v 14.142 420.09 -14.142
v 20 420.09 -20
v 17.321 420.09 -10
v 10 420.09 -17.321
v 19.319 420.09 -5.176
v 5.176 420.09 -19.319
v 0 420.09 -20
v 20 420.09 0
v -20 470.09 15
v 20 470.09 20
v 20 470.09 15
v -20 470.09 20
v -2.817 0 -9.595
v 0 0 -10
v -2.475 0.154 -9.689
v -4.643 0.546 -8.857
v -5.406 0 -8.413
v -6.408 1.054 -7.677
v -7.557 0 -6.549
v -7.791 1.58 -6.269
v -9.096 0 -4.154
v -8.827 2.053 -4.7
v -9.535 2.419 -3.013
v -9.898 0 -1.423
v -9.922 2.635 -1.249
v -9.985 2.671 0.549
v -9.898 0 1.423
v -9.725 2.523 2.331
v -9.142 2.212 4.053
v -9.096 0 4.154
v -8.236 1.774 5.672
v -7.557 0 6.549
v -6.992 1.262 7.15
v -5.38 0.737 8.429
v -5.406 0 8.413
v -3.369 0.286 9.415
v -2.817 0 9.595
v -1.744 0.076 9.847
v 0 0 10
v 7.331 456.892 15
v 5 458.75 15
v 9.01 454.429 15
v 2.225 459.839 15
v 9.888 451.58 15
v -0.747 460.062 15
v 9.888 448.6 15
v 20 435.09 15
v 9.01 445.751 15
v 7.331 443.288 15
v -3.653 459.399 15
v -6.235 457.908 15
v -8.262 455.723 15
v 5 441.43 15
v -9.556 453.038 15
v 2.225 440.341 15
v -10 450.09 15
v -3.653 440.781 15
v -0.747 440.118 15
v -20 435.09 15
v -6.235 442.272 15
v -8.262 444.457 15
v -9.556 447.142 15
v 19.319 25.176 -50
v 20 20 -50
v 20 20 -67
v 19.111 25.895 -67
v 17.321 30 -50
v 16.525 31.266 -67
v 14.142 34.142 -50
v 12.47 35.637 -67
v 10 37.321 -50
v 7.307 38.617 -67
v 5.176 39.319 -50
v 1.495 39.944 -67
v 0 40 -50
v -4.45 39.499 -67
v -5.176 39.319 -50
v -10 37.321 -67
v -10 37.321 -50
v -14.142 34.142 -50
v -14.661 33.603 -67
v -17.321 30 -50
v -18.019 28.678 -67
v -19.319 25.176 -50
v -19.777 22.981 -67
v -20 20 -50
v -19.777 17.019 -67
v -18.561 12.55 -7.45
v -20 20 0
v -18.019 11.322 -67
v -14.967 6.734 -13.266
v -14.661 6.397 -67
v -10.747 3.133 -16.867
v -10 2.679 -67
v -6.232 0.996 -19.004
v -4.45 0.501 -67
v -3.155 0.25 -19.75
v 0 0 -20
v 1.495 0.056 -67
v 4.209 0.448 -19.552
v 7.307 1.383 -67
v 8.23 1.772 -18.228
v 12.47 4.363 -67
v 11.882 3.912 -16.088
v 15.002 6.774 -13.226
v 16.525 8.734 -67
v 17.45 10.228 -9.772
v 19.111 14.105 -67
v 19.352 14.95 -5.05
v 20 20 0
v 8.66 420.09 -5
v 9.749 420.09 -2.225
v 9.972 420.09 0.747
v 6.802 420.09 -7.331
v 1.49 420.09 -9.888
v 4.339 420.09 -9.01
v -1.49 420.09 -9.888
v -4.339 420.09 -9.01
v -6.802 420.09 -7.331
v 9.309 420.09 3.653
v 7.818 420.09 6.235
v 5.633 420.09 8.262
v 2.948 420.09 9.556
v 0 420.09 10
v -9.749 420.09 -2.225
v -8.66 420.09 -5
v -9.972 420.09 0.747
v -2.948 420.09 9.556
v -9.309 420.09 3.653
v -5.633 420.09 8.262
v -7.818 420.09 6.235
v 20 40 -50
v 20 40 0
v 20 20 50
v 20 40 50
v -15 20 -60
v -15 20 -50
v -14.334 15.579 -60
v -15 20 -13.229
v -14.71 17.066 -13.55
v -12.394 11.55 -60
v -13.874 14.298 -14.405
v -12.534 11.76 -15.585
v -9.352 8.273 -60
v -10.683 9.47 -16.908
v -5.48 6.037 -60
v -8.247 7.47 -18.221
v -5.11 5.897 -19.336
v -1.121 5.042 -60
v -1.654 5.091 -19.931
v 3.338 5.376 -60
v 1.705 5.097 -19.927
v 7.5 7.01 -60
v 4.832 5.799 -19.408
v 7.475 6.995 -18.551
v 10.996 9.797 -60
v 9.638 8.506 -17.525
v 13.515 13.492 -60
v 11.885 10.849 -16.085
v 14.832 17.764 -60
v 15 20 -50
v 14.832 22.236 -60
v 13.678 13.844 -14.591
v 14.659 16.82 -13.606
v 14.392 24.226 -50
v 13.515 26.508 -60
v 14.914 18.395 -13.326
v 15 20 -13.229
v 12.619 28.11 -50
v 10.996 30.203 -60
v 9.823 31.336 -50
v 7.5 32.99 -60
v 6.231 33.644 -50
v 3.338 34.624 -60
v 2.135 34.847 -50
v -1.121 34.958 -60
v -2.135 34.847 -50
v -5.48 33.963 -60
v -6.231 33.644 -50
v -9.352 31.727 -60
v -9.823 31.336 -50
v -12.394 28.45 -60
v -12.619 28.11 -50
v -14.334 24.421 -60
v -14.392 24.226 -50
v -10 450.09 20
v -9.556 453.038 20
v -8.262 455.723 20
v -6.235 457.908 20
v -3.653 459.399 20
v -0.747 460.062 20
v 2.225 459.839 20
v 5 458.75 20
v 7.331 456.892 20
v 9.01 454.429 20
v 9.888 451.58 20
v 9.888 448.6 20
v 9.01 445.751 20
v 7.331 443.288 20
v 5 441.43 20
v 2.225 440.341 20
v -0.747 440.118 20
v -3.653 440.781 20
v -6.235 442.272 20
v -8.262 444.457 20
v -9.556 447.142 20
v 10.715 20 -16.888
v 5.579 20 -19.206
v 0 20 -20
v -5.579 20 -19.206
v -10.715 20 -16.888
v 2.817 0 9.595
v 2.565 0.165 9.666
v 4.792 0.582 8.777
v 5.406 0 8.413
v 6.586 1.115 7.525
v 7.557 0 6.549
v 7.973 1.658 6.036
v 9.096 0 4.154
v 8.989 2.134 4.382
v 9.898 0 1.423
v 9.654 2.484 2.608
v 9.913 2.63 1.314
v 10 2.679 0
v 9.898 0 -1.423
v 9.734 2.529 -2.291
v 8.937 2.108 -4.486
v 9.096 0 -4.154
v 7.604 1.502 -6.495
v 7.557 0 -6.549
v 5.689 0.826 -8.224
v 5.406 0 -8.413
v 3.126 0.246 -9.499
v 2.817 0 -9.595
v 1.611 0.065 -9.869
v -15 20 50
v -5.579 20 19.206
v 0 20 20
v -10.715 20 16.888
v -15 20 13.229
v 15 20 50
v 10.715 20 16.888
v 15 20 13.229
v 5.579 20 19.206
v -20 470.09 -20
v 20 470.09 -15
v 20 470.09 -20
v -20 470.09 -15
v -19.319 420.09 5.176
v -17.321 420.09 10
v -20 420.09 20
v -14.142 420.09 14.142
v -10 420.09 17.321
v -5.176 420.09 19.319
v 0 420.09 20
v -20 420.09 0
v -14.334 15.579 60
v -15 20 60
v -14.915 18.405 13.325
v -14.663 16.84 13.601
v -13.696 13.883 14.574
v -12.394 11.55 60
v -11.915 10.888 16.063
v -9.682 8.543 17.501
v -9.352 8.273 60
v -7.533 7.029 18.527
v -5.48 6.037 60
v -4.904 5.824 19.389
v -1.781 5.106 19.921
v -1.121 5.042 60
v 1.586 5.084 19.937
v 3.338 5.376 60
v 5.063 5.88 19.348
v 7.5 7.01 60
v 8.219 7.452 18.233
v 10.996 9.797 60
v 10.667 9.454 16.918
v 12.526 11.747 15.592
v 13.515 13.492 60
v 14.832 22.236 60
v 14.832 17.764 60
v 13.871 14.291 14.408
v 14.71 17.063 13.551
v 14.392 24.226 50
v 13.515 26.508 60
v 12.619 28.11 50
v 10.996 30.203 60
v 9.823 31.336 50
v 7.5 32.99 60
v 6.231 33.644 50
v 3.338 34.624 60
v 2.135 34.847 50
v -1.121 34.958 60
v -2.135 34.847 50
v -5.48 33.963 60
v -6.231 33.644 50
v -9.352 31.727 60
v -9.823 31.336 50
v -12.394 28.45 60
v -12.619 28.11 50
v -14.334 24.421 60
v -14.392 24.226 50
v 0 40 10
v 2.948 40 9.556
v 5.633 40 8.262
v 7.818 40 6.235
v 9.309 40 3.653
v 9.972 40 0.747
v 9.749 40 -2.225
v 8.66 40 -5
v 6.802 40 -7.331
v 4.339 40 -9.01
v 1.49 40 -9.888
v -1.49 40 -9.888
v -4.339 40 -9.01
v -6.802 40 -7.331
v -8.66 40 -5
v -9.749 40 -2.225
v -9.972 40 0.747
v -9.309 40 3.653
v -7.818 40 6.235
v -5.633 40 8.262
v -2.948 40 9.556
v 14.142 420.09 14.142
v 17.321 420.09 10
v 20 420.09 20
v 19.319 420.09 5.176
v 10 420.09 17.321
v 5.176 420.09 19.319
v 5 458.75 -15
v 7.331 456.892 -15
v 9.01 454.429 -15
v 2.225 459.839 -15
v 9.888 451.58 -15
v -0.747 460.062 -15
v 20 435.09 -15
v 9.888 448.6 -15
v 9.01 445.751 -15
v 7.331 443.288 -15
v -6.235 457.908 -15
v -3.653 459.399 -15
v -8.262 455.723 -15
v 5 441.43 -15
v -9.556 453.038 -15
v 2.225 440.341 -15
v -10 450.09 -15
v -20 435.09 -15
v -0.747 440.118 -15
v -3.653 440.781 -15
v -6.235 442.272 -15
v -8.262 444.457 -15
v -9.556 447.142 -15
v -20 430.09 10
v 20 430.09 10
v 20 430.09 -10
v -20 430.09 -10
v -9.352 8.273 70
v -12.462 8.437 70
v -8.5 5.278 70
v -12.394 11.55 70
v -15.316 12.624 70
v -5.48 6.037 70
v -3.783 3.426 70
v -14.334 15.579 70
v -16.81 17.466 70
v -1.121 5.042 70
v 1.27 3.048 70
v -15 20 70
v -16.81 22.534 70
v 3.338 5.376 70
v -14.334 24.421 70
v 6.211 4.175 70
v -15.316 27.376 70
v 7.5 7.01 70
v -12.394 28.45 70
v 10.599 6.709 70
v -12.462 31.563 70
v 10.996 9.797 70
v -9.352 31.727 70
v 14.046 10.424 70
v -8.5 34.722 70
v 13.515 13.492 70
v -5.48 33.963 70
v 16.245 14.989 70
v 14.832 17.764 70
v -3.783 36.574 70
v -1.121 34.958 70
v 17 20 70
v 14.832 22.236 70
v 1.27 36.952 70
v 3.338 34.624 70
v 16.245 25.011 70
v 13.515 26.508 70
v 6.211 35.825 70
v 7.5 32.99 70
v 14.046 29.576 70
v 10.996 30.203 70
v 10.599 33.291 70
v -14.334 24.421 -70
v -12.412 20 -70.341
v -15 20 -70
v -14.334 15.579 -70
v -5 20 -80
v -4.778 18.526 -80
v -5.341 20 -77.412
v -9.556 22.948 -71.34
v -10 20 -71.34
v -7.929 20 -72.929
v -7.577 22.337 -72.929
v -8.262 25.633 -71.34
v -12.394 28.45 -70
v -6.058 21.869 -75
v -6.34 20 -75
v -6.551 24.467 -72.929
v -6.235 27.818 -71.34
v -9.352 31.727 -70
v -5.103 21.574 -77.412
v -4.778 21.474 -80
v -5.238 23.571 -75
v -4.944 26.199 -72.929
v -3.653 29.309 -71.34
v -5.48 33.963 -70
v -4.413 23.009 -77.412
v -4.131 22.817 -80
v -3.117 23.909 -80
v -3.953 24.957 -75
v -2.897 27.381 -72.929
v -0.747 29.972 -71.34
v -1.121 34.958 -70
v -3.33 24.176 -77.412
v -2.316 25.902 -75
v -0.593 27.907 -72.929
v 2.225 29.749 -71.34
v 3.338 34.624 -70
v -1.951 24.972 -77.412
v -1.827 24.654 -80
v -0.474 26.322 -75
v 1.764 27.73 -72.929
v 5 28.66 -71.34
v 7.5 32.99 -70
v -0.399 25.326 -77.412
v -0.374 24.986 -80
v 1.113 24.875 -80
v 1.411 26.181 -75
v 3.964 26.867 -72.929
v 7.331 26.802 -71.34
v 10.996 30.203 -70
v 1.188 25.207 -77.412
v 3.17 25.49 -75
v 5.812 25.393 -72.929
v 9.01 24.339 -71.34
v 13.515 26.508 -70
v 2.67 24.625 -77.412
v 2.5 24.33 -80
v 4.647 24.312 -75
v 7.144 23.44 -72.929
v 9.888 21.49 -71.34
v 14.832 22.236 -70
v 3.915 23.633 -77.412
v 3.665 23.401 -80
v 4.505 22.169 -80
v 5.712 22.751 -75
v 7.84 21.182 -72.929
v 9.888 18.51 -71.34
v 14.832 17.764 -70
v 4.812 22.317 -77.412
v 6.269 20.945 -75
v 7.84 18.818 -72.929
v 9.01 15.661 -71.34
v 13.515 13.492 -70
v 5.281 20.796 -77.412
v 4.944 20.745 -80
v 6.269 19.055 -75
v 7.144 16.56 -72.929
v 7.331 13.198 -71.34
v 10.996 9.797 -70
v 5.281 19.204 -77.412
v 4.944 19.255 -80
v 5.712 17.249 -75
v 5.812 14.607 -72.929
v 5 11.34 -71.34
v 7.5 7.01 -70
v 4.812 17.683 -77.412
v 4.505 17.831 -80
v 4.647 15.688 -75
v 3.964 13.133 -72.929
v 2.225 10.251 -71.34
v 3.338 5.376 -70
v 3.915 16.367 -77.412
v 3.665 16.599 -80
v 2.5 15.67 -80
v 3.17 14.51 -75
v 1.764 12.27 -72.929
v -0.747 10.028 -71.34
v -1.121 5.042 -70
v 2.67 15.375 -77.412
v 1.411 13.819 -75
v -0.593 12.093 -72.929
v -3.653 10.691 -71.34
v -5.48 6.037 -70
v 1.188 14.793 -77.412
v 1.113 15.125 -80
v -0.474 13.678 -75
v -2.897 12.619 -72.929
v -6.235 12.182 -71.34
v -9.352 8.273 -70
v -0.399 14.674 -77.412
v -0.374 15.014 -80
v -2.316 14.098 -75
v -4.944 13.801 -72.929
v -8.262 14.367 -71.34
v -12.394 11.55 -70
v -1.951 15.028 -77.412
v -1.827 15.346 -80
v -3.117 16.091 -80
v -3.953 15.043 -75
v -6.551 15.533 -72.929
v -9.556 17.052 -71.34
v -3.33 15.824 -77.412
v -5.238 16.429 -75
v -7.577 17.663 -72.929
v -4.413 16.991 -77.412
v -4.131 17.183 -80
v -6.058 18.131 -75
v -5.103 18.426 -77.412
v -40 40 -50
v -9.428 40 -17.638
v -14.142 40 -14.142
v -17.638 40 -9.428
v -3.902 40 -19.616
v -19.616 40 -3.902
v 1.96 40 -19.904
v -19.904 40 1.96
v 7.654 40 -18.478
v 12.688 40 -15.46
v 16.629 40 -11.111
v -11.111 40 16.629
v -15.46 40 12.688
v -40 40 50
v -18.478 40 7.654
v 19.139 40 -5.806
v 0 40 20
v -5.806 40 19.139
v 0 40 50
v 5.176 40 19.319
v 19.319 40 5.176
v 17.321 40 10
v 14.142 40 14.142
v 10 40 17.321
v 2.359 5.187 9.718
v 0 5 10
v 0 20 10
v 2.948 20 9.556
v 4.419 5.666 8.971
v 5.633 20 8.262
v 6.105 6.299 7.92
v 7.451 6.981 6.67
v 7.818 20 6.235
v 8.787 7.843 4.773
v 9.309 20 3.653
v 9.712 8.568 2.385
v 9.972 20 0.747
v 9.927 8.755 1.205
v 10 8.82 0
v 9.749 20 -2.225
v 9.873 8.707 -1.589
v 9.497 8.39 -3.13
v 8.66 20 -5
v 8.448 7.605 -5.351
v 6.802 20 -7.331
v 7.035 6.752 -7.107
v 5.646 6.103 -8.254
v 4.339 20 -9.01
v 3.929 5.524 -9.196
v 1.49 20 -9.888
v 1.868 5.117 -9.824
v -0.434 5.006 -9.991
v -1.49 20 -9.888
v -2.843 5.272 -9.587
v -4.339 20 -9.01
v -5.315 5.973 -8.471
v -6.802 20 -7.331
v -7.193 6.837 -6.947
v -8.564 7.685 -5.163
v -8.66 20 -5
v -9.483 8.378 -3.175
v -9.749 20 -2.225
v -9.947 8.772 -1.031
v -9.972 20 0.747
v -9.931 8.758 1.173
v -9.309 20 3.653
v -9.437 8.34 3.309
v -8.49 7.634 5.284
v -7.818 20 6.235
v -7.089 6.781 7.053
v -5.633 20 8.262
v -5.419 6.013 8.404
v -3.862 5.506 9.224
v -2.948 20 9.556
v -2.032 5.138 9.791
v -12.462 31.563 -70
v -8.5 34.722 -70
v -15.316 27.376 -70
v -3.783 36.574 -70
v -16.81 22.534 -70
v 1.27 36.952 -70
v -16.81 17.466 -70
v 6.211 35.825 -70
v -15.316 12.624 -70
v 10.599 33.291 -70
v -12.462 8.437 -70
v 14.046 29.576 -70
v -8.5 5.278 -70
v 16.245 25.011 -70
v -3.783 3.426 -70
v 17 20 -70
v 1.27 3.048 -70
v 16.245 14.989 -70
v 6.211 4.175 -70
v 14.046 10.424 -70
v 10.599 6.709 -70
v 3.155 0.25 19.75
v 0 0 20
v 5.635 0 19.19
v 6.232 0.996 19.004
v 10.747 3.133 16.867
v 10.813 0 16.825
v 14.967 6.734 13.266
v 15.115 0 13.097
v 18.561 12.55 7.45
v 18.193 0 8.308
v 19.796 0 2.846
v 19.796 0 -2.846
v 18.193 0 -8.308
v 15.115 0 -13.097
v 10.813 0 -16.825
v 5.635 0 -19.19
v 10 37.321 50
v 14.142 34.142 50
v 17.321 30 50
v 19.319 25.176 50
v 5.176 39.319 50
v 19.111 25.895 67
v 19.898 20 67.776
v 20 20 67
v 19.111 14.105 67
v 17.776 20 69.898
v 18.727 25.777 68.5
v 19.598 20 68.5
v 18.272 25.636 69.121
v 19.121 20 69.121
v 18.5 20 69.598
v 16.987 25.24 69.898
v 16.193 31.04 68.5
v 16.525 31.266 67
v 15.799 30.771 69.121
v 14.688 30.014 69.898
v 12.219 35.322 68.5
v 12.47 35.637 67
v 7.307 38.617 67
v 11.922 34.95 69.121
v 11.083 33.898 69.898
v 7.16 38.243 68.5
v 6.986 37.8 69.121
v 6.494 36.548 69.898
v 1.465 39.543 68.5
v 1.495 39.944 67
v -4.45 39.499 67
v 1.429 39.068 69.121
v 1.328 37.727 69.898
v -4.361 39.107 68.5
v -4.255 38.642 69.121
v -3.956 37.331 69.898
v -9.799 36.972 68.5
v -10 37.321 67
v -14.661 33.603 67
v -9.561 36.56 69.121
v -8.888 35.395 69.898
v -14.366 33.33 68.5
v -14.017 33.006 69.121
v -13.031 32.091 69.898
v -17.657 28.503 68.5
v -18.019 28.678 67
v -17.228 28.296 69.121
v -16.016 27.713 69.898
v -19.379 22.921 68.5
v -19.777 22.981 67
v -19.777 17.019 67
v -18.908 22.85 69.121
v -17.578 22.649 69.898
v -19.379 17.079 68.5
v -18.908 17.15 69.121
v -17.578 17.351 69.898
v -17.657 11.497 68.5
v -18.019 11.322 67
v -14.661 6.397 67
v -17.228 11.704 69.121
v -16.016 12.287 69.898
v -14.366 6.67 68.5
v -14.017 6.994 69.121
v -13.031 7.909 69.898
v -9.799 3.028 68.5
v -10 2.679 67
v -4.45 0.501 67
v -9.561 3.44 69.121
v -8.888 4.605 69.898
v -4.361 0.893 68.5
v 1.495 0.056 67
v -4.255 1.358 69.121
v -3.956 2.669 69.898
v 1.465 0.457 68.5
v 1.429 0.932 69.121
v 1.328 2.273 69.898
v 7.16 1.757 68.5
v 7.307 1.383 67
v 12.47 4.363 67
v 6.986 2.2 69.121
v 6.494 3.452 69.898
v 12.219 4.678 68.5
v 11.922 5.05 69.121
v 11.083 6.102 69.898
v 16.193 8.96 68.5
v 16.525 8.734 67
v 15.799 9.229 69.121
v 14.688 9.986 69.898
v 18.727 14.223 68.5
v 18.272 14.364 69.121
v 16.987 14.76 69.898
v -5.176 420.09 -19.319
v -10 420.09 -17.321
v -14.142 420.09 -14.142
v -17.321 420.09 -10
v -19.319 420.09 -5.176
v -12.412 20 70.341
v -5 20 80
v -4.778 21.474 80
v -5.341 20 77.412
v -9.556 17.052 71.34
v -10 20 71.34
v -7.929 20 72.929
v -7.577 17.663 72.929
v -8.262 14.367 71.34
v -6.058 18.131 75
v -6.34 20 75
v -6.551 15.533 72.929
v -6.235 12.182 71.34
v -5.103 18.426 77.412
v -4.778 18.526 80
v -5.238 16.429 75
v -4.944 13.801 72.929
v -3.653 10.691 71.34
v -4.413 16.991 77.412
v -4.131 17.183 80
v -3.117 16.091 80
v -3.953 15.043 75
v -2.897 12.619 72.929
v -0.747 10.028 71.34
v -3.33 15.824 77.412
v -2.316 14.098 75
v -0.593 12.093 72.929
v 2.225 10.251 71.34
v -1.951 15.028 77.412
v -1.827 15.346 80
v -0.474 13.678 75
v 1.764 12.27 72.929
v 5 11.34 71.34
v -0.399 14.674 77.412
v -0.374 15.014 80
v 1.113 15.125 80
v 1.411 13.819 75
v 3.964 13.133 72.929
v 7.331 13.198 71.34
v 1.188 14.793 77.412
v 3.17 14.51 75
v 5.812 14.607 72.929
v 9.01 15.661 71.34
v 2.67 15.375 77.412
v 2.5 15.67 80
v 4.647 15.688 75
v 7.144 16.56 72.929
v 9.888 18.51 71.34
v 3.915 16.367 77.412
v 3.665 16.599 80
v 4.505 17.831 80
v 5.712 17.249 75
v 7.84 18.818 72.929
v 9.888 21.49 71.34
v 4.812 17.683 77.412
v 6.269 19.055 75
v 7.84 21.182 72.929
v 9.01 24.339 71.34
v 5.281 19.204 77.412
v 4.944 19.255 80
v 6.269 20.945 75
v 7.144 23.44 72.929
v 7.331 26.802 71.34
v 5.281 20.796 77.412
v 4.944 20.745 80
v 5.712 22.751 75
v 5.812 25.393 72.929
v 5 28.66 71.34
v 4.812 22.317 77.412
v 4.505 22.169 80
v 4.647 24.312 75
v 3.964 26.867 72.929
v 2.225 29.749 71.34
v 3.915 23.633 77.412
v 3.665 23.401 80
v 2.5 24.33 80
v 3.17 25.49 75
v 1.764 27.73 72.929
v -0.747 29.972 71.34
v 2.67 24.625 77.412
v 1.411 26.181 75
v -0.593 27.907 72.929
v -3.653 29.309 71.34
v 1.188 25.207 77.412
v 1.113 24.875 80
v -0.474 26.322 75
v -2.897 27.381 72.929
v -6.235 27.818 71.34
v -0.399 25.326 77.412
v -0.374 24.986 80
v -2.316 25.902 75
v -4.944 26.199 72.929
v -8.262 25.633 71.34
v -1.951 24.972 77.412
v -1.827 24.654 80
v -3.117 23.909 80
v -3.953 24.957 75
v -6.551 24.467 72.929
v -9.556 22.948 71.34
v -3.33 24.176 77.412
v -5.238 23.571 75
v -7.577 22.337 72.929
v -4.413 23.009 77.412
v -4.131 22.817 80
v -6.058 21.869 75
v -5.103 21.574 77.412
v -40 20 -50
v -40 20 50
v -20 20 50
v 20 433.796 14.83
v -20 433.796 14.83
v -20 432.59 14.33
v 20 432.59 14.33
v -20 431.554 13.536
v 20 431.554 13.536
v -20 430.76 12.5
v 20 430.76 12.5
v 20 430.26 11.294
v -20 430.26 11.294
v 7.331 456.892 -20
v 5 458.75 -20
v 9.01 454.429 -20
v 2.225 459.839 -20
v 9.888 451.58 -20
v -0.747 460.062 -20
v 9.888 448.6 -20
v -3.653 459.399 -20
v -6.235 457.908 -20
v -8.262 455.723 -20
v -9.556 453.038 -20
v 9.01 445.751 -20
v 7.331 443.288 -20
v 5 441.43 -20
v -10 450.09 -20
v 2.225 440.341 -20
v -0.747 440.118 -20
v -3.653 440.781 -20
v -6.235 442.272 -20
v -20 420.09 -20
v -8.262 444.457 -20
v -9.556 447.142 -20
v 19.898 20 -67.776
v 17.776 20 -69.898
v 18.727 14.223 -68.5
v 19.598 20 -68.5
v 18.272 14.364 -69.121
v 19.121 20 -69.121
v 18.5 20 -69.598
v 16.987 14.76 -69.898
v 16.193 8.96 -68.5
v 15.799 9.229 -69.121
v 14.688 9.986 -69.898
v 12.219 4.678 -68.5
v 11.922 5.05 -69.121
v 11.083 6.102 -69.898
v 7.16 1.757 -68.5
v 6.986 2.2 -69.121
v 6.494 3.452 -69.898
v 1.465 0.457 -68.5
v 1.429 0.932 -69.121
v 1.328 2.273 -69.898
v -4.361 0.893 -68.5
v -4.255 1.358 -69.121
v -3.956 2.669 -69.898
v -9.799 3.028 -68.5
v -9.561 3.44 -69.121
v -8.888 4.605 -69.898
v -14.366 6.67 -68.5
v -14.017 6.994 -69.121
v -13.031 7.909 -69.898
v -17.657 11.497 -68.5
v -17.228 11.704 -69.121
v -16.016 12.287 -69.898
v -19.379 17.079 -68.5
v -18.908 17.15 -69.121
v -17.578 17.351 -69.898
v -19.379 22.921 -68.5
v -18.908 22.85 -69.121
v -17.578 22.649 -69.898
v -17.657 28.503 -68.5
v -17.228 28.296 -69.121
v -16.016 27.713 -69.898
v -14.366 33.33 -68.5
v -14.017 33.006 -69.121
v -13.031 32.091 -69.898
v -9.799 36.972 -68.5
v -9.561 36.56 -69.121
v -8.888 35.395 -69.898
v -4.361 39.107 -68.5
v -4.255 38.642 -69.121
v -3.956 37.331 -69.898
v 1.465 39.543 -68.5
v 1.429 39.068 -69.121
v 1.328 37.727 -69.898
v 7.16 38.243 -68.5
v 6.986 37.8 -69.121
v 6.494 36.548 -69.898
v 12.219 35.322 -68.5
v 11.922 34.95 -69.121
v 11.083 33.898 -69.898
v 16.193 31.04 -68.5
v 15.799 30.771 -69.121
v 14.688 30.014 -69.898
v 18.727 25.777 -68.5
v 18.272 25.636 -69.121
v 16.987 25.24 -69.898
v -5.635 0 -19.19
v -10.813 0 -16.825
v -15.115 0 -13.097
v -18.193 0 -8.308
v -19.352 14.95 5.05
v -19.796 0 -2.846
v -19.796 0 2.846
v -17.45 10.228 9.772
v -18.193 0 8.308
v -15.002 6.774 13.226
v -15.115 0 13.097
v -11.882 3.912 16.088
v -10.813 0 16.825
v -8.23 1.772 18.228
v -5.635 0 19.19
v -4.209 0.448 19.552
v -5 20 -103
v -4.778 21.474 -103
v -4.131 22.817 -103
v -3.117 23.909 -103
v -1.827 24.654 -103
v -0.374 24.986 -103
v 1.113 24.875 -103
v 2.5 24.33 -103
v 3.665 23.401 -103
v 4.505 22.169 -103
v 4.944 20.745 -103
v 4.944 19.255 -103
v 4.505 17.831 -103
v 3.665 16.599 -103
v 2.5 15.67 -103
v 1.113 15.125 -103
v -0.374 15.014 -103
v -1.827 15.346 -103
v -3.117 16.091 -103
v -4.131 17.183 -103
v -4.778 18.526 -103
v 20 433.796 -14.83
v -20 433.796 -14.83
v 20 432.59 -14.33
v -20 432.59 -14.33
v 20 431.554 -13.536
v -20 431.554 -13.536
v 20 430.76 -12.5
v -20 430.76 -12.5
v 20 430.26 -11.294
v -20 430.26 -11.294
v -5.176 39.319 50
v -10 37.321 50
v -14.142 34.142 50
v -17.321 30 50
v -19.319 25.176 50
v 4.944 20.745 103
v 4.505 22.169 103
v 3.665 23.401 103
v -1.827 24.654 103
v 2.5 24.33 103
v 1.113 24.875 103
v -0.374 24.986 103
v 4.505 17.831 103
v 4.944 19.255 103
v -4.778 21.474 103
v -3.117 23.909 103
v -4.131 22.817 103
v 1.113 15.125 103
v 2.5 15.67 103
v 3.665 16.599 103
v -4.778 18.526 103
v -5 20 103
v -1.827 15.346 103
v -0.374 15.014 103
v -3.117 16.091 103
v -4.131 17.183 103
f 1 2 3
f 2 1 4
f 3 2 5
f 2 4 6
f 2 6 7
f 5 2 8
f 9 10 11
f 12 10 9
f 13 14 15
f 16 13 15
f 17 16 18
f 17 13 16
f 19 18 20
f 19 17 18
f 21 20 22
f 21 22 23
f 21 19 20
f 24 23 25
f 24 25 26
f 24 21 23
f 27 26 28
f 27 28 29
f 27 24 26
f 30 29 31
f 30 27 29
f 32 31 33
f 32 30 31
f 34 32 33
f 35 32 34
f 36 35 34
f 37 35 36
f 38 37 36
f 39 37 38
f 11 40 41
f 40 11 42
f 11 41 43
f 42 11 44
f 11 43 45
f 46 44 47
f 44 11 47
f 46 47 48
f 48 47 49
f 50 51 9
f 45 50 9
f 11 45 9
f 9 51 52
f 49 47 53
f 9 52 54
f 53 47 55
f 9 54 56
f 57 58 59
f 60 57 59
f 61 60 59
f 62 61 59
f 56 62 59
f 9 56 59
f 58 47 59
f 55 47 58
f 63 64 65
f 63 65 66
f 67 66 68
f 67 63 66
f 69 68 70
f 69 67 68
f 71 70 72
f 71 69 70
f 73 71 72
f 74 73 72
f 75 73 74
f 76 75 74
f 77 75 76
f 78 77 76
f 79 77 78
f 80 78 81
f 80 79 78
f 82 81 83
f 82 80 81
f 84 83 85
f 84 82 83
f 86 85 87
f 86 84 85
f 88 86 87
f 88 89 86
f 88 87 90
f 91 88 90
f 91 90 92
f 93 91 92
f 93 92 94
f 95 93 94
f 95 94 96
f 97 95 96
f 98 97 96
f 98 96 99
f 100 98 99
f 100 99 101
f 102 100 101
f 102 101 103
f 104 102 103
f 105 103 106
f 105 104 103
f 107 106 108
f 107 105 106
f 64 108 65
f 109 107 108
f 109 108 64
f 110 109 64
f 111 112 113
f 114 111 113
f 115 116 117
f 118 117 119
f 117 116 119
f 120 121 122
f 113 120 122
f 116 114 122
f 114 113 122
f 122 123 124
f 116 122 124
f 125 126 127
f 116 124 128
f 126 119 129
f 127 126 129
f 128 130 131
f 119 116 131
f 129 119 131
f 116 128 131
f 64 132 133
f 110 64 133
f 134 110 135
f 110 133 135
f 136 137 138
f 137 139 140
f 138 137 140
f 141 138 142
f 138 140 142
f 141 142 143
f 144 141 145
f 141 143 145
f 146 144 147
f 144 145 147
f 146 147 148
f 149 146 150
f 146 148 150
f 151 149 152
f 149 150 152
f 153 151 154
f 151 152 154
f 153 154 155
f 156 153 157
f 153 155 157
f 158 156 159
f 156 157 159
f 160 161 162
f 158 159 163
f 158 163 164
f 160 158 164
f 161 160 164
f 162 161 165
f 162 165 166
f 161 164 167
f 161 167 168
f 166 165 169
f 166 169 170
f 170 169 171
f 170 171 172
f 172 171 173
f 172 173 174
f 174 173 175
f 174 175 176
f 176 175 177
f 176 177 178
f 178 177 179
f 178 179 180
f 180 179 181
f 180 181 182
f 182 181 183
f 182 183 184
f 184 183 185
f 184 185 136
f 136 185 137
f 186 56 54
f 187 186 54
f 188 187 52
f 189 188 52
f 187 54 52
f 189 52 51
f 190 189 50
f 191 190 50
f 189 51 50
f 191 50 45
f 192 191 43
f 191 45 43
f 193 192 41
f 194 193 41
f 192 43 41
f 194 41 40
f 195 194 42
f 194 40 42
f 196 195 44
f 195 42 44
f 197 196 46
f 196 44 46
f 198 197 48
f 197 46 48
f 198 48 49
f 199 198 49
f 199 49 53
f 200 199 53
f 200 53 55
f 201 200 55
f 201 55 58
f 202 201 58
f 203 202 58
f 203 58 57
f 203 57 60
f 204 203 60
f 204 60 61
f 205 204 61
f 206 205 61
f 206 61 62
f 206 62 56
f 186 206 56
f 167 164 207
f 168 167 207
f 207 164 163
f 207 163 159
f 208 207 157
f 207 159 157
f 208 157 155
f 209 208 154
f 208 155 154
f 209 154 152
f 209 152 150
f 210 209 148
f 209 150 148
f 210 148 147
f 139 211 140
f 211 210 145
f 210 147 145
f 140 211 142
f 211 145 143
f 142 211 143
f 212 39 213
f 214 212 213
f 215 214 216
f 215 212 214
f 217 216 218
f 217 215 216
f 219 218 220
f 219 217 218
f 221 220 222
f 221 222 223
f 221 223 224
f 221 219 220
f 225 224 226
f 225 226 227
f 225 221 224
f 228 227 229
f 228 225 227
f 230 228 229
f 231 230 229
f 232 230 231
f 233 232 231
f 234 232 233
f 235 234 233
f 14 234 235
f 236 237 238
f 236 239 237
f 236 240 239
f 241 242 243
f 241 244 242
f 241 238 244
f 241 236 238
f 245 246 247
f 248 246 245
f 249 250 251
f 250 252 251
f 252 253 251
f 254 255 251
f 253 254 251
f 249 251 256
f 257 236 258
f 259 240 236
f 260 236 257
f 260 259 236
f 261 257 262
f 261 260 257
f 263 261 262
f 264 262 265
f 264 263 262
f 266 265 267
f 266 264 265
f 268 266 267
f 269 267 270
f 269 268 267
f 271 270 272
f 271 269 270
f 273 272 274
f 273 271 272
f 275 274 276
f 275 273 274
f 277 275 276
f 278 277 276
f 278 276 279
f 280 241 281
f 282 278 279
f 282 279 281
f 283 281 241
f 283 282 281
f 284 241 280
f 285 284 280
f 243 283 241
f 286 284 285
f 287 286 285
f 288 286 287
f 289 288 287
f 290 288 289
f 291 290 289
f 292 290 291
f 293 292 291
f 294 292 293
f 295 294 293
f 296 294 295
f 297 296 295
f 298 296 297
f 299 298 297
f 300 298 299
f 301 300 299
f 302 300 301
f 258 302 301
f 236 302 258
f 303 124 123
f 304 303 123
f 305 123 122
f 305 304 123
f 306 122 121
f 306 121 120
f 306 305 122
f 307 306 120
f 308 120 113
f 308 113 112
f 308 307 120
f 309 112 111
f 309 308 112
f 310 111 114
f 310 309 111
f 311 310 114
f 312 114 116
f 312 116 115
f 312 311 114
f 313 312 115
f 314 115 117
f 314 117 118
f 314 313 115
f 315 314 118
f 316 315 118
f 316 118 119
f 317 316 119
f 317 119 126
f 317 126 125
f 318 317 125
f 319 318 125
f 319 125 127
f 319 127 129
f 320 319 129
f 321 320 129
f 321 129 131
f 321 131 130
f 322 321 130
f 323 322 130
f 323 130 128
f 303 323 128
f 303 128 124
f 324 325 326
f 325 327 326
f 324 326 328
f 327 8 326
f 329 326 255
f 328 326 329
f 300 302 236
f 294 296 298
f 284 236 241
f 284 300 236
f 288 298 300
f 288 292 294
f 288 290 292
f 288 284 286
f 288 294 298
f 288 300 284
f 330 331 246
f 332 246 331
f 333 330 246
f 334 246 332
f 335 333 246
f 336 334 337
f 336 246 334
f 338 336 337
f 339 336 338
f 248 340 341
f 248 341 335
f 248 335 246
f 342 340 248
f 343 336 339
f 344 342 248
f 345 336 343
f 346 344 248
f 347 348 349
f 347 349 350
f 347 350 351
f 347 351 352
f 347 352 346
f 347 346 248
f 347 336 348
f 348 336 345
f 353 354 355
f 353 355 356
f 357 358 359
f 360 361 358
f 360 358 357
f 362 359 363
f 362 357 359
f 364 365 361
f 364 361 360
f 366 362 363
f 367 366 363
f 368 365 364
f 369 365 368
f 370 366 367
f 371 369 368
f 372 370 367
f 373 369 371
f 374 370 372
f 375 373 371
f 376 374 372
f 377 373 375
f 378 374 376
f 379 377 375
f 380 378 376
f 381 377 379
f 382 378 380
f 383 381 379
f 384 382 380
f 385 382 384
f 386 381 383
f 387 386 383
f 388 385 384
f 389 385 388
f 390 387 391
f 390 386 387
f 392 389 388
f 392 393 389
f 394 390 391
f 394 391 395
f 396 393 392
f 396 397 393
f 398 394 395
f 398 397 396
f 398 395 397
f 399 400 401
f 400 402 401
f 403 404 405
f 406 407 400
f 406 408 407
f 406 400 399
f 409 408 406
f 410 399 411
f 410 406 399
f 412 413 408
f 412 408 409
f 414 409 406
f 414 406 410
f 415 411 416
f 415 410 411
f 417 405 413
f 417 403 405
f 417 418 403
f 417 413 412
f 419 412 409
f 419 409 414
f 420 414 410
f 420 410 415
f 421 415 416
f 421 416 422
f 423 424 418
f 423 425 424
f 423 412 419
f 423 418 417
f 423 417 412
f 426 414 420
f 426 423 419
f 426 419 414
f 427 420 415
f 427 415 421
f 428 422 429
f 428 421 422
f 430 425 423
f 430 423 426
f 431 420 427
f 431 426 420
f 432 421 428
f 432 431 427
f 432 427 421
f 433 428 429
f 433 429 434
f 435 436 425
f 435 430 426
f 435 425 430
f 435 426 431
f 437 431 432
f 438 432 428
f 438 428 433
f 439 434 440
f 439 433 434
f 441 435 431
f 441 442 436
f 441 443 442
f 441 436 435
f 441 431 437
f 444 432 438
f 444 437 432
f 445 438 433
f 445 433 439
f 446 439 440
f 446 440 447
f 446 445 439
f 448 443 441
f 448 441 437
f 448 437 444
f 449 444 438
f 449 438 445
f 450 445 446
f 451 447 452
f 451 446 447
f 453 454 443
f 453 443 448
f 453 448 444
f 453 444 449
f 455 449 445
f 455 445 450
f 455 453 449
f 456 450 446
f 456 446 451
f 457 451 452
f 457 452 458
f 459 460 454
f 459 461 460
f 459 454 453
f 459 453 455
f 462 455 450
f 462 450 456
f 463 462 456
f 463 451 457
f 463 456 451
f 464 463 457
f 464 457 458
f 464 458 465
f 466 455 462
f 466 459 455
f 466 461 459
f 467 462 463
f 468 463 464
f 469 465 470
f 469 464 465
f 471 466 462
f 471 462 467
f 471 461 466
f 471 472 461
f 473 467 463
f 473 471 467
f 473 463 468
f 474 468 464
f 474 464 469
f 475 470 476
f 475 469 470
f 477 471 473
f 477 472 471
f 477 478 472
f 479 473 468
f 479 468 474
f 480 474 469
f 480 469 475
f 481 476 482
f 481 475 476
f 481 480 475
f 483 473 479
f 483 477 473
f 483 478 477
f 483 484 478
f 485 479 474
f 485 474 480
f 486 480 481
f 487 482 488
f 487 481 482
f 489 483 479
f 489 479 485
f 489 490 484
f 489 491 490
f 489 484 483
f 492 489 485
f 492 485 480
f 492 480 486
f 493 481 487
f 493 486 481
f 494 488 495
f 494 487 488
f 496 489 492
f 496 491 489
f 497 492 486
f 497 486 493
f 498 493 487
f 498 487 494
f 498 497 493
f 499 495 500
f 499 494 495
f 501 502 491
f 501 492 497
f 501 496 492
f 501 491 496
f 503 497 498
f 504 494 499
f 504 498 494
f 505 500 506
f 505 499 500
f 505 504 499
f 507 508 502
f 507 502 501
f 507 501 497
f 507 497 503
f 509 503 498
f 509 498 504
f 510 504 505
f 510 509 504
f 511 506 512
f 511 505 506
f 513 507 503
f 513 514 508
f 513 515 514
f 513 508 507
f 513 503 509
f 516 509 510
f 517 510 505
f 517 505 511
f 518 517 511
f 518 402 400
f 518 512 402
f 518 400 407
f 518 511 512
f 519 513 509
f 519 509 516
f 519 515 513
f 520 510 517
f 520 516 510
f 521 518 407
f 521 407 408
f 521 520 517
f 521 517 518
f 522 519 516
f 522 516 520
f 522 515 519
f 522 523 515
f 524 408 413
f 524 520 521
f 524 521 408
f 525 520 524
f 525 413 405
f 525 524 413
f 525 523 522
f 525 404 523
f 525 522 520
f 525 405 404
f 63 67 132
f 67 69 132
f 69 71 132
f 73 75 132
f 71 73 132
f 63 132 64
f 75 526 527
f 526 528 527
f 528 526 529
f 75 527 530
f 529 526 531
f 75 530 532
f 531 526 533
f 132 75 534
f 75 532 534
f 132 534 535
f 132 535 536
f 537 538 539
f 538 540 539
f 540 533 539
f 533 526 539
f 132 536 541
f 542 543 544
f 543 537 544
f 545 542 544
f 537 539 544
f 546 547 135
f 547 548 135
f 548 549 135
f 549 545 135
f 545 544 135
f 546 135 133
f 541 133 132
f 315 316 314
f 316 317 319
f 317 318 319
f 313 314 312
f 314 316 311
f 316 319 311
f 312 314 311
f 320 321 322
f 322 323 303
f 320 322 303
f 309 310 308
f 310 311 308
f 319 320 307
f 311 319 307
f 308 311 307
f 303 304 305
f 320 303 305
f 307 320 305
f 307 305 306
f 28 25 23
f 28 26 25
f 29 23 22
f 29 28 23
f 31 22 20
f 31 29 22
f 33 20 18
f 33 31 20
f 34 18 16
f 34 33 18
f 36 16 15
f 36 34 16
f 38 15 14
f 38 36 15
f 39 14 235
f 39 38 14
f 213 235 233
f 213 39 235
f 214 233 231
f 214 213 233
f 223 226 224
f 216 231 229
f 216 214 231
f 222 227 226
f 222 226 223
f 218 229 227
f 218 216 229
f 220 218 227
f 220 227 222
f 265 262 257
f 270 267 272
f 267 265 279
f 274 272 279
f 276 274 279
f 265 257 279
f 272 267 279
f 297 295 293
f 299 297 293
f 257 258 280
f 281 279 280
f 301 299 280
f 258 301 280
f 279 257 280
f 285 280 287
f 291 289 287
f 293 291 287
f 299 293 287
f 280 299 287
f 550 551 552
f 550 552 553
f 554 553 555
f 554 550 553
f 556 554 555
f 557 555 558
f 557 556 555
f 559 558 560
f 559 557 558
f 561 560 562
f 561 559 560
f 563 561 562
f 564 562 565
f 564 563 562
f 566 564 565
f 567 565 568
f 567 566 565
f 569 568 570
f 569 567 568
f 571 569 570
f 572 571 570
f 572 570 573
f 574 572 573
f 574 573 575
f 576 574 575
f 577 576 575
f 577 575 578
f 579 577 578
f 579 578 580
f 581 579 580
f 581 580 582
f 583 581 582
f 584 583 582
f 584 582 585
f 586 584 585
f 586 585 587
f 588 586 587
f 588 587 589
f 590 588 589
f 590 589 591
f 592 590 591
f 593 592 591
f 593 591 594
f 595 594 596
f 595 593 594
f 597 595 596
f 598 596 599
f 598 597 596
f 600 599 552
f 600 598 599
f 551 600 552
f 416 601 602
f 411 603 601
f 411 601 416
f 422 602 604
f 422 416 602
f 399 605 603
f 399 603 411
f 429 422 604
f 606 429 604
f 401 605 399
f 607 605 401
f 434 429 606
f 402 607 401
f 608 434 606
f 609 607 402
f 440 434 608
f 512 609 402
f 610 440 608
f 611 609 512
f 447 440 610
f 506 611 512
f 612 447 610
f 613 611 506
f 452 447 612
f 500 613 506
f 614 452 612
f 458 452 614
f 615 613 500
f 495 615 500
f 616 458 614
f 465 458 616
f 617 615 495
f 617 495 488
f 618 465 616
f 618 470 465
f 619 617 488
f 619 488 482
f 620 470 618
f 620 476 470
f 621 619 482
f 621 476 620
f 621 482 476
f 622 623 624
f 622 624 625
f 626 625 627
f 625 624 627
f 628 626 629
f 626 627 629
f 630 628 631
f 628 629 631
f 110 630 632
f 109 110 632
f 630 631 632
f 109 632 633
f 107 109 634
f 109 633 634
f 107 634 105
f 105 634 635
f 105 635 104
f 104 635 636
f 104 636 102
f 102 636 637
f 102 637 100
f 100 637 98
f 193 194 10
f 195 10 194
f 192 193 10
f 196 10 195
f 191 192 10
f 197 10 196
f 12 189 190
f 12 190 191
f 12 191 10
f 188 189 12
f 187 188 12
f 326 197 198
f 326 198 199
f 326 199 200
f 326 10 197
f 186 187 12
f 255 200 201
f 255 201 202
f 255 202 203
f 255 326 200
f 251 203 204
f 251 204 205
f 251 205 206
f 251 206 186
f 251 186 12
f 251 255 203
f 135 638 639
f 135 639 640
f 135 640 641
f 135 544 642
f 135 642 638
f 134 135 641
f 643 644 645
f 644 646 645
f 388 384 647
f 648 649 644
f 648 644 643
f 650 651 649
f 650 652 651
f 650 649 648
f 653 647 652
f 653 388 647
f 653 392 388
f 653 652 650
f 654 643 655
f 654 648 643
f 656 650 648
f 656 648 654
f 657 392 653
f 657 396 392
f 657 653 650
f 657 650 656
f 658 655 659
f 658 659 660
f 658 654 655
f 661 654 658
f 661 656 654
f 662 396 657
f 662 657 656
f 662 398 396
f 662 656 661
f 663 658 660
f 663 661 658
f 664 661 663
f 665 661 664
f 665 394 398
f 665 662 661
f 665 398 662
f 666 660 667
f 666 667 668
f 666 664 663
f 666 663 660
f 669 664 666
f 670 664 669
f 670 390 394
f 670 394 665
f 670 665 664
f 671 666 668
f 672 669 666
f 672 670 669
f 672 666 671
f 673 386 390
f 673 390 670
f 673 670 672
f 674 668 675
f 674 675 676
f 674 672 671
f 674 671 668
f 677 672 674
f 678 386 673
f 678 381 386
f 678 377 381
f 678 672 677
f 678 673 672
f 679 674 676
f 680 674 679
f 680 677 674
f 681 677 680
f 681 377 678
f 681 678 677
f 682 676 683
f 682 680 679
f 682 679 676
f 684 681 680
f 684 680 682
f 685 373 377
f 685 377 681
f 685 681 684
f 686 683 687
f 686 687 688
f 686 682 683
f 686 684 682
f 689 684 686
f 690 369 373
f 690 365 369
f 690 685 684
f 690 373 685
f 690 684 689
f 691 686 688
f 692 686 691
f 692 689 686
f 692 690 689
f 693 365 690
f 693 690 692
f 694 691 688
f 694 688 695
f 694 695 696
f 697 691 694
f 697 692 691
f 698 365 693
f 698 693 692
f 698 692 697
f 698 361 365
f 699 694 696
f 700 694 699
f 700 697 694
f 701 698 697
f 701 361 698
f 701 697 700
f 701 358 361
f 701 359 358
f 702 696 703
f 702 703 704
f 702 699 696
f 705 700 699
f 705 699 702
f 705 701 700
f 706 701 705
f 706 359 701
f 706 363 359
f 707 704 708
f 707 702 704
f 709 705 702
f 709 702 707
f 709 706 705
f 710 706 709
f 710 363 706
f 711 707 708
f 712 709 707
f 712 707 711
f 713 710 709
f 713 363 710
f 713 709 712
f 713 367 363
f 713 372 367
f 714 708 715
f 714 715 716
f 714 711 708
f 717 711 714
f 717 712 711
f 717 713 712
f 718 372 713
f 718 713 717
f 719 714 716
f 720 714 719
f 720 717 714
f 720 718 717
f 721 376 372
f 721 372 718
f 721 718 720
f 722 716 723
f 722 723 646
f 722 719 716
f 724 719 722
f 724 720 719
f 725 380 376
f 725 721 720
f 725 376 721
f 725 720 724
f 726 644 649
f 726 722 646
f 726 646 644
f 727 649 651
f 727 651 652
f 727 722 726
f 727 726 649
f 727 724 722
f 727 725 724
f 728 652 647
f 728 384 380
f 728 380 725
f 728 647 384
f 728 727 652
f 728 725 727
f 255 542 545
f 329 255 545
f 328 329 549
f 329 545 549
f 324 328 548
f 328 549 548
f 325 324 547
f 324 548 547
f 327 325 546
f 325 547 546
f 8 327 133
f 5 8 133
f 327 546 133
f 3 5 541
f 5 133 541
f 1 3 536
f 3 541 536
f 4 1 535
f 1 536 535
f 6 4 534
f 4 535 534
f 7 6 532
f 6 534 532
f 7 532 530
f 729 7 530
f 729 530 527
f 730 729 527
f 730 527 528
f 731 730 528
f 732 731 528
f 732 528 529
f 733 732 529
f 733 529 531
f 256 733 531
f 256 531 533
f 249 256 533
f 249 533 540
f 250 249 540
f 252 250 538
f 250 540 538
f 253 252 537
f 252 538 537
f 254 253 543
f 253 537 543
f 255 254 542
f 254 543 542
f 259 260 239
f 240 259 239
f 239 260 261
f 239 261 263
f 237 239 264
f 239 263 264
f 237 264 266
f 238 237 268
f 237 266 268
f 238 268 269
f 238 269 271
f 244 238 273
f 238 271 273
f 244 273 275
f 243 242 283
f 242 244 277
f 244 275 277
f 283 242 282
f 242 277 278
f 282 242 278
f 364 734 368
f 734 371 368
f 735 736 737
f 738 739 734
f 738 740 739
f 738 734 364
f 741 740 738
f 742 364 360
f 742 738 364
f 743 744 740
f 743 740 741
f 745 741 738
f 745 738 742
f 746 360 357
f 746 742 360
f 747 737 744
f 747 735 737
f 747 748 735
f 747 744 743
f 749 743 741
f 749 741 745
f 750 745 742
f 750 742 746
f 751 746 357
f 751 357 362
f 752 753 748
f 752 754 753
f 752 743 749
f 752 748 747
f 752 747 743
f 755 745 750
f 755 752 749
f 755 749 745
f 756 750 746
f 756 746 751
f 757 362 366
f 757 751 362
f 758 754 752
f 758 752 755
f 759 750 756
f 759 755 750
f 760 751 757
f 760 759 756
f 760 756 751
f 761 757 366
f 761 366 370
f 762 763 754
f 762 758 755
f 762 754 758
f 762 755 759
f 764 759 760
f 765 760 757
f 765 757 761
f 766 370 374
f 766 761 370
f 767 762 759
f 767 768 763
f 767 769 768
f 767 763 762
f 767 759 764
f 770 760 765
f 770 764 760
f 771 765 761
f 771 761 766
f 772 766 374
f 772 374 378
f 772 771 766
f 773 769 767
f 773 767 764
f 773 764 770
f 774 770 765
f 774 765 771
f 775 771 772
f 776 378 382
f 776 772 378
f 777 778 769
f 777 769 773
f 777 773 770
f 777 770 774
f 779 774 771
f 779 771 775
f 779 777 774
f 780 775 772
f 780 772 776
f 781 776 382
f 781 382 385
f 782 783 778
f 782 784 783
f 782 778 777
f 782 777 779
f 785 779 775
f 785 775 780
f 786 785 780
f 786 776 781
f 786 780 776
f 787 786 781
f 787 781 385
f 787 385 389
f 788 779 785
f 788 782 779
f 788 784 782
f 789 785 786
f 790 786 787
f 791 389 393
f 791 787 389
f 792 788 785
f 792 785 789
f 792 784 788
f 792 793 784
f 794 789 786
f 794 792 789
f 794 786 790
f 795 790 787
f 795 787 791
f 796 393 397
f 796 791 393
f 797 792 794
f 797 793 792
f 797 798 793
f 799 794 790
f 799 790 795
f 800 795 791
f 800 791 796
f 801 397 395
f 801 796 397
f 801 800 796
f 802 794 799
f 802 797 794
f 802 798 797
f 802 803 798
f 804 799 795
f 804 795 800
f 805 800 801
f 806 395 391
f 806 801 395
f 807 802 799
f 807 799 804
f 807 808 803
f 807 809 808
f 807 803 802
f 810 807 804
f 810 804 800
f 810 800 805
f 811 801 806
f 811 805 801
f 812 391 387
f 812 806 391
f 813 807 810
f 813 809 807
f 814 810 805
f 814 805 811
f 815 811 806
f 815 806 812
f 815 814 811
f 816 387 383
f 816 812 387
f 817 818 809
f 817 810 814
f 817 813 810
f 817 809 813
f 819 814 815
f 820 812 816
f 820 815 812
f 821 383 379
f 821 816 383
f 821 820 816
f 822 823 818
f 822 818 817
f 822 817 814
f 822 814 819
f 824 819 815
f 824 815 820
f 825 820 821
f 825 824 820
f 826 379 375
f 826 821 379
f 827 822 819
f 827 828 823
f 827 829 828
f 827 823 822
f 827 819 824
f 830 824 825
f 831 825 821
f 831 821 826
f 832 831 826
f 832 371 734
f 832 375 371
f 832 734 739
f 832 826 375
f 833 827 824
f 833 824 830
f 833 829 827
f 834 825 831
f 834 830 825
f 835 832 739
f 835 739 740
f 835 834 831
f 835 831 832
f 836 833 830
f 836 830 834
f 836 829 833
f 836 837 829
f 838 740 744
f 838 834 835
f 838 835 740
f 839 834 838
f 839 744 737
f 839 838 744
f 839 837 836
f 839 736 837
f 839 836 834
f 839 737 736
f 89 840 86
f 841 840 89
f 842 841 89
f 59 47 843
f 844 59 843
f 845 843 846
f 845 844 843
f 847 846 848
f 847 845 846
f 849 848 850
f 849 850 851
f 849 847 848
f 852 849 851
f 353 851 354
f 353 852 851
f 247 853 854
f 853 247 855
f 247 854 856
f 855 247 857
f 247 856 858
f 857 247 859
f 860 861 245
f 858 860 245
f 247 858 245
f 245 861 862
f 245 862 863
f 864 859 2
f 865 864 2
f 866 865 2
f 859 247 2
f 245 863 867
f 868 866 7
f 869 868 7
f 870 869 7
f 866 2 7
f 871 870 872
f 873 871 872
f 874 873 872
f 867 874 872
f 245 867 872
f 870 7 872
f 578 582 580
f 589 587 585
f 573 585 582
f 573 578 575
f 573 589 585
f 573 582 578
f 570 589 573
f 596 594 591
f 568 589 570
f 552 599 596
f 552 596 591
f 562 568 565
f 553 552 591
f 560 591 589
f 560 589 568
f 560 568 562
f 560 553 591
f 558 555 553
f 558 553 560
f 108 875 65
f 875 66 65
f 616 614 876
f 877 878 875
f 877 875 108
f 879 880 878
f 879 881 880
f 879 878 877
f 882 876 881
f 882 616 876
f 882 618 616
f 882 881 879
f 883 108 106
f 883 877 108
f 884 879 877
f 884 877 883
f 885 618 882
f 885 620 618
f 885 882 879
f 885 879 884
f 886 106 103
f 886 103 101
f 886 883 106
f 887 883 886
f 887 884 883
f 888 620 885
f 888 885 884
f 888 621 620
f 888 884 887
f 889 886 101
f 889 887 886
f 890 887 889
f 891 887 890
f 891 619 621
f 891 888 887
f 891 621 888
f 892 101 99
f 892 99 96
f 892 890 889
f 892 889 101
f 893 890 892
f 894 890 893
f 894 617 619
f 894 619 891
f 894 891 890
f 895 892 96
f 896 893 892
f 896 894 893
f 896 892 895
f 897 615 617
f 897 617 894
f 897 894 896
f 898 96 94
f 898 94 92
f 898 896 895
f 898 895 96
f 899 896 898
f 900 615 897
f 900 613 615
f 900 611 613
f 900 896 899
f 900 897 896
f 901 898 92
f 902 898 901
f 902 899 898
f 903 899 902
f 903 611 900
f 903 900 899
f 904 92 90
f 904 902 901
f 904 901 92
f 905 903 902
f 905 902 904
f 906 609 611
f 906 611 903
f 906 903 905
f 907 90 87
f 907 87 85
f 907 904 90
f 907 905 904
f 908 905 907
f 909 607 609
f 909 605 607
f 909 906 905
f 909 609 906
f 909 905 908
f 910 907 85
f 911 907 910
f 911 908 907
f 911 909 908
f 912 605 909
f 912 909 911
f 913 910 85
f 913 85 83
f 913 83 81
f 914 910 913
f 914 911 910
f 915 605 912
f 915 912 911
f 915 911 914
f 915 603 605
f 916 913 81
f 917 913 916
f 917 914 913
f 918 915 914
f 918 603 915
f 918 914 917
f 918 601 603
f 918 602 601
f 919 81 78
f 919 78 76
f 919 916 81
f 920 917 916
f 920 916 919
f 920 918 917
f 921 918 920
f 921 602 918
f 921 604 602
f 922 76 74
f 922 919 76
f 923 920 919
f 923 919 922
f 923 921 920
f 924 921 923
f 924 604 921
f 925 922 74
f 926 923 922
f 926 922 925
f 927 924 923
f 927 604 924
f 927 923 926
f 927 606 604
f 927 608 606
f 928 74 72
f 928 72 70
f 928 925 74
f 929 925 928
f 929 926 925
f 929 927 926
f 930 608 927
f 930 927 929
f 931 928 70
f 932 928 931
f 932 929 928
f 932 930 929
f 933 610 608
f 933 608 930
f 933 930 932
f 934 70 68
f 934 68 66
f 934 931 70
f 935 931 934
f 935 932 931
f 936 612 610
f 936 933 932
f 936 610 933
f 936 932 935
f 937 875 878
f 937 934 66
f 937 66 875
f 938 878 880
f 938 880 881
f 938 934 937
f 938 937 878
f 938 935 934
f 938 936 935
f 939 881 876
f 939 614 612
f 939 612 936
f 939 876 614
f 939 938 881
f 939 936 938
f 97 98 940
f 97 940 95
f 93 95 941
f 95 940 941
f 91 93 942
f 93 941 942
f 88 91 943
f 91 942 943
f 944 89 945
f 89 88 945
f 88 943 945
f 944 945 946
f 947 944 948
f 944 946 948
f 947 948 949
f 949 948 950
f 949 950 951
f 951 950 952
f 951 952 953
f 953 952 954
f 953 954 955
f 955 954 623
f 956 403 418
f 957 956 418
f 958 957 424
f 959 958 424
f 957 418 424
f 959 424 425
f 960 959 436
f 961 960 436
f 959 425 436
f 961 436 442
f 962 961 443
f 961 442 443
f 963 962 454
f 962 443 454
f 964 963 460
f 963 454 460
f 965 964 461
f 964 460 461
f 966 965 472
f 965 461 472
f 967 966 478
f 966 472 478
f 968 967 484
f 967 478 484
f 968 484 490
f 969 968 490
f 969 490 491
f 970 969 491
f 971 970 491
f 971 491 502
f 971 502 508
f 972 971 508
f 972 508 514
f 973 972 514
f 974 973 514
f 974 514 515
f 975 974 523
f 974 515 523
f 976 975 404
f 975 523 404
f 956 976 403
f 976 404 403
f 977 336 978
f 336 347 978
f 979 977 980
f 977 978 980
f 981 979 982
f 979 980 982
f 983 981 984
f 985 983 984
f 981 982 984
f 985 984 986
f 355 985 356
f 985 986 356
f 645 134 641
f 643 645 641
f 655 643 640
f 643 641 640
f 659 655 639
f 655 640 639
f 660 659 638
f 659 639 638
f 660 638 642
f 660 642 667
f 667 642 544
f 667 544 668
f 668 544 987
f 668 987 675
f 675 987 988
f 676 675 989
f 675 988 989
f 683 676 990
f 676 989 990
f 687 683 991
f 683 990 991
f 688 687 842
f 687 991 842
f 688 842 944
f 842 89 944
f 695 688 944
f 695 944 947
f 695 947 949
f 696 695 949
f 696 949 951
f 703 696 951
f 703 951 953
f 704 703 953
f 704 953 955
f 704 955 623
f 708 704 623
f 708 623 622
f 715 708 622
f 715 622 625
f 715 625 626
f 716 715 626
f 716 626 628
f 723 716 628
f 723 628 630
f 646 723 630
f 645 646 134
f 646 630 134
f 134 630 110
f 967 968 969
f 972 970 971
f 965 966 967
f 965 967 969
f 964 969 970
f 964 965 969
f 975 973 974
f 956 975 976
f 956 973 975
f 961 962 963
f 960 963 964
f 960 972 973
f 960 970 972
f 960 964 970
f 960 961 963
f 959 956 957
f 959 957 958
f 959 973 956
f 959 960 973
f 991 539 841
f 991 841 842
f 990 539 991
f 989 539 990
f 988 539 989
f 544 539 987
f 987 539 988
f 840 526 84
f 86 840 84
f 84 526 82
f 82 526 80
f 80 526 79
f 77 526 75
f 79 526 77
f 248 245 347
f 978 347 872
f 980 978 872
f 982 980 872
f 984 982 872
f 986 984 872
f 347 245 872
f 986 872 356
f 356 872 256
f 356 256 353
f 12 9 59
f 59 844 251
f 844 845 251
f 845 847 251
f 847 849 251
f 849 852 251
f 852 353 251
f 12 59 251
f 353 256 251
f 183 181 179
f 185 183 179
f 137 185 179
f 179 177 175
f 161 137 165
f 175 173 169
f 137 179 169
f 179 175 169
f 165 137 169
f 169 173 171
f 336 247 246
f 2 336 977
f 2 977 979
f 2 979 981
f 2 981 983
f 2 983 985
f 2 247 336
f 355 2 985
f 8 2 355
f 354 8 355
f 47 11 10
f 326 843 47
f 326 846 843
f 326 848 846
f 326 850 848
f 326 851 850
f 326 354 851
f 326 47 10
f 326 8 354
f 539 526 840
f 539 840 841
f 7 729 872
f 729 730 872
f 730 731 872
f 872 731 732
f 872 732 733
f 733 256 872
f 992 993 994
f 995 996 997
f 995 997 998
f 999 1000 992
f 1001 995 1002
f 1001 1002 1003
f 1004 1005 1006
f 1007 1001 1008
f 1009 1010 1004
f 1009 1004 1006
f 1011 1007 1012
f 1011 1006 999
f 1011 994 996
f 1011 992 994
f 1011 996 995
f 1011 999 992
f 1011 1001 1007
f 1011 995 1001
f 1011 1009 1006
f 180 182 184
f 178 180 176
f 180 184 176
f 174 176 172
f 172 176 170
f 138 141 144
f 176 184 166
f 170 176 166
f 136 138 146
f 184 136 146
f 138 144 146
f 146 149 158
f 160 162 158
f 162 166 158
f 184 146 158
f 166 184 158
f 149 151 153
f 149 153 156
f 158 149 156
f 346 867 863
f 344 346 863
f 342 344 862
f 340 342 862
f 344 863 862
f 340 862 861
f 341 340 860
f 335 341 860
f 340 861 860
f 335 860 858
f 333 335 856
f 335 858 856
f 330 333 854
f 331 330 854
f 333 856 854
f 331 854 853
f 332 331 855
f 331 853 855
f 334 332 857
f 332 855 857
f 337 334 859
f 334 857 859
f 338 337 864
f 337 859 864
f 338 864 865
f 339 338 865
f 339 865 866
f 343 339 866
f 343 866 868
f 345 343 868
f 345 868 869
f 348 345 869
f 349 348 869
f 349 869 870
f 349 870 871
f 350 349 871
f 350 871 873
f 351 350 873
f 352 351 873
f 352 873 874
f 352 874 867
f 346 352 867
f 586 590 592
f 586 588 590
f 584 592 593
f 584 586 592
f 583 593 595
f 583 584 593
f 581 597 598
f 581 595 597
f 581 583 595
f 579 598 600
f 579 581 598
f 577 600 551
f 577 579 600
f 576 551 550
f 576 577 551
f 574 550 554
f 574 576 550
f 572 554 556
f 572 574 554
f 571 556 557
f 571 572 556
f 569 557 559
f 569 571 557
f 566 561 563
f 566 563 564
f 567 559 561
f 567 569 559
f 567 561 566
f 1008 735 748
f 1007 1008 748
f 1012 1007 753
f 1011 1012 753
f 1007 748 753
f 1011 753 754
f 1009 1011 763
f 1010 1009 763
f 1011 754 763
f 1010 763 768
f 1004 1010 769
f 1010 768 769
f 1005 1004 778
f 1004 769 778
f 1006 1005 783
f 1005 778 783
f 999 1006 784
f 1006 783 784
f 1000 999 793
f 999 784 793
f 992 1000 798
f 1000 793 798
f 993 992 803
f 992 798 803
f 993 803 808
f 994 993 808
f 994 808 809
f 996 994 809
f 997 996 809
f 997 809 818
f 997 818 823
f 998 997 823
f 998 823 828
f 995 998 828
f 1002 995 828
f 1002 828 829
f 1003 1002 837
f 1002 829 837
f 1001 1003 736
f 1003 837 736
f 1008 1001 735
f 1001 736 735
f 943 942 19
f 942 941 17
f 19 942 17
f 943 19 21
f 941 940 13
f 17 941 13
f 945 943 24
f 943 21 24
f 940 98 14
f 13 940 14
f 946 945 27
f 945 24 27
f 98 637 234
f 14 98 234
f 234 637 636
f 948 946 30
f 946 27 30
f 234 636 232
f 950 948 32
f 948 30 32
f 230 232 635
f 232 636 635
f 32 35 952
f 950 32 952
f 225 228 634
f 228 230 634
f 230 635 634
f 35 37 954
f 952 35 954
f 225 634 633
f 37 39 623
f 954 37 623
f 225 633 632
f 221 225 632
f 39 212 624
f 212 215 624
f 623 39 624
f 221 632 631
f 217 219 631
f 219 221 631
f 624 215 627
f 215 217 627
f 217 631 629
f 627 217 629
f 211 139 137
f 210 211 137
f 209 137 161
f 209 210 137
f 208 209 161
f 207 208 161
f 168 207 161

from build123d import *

# Parameters (mm, degrees)
SKETCH2_R           = 20
SKETCH2_R_2         = 10
EXTRUDE1_DEPTH      = 420.09
SKETCH3_R           = 20
SKETCH3_R_2         = 15
EXTRUDE2_DEPTH      = 60
EXTRUDE2_DEPTH_BACK = 60
SKETCH4_R           = 20
EXTRUDE3_DEPTH      = 10
SKETCH5_R           = 20
EXTRUDE4_DEPTH      = 10
SKETCH6_R           = 5
EXTRUDE5_DEPTH      = 33
SKETCH7_R           = 5
EXTRUDE6_DEPTH      = 33
SKETCH8_W           = 40
SKETCH8_H           = 40
EXTRUDE7_DEPTH      = 10
SKETCH9_W           = 40
SKETCH9_H           = 5
EXTRUDE8_DEPTH      = 40
SKETCH10_R          = 10
CUT_EXTRUDE1_DEPTH  = 124
FILLET1_R           = 3
FILLET2_R           = 3
SKETCH11_W          = 60
SKETCH11_H          = 100
EXTRUDE9_DEPTH      = 20
FILLET3_R           = 10
FILLET4_R           = 5


with BuildPart() as part:
    # Sketch2 → Extrude1 (new body)
    with BuildSketch(Plane(origin=(0, 0, 0), x_dir=(1, 0, 0), z_dir=(0, 1, 0))):
        with Locations(Location((0, 0, 0), (0, 0, 270))):  # turned: the seam where the file's is
            Circle(SKETCH2_R)
        with Locations(Location((0, 0, 0), (0, 0, 270))):  # turned: the seam where the file's is
            Circle(SKETCH2_R_2, mode=Mode.SUBTRACT)
    extrude(amount=EXTRUDE1_DEPTH)

    # Sketch3 → Extrude2 (add, two sides)
    with BuildSketch(Plane.XY) as extrude2_sk:
        with Locations((0, 20)):
            Circle(SKETCH3_R)
        with Locations(Location((0, 20, 0), (0, 0, 180))):  # turned: the seam where the file's is
            Circle(SKETCH3_R_2, mode=Mode.SUBTRACT)
    extrude(amount=EXTRUDE2_DEPTH)
    extrude(extrude2_sk.sketch, amount=-EXTRUDE2_DEPTH_BACK)

    # Sketch4 → Extrude3 (add)
    with BuildSketch(Plane.XY.offset(60)):
        with Locations((0, 20)):
            Circle(SKETCH4_R)
    extrude(amount=EXTRUDE3_DEPTH)

    # Sketch5 → Extrude4 (add)
    with BuildSketch(Plane(origin=(0, 0, -60), x_dir=(-1, 0, 0), z_dir=(0, 0, -1))):
        with Locations(Location((0, 20, 0), (0, 0, 180))):  # turned: the seam where the file's is
            Circle(SKETCH5_R)
    extrude(amount=EXTRUDE4_DEPTH)

    # Sketch6 → Extrude5 (add)
    with BuildSketch(Plane(origin=(0, 0, -70), x_dir=(-1, 0, 0), z_dir=(0, 0, -1))):
        with Locations((0, 20)):
            Circle(SKETCH6_R)
    extrude(amount=EXTRUDE5_DEPTH)

    # Sketch7 → Extrude6 (add)
    with BuildSketch(Plane.XY.offset(70)):
        with Locations(Location((0, 20, 0), (0, 0, 180))):  # turned: the seam where the file's is
            Circle(SKETCH7_R)
    extrude(amount=EXTRUDE6_DEPTH)

    # Sketch8 → Extrude7 (add)
    with BuildSketch(Plane(origin=(0, 420.09, 0), x_dir=(-1, 0, 0), z_dir=(0, 1, 0))):
        Rectangle(SKETCH8_W, SKETCH8_H)
    extrude(amount=EXTRUDE7_DEPTH)

    # Sketch9 → Extrude8 (add)
    with BuildSketch(Plane(origin=(0, 430.09, 0), x_dir=(-1, 0, 0), z_dir=(0, 1, 0))):
        with Locations((0, 17.5)):
            Rectangle(SKETCH9_W, SKETCH9_H)
        with Locations((0, -17.5)):
            Rectangle(SKETCH9_W, SKETCH9_H)
    extrude(amount=EXTRUDE8_DEPTH)

    # Sketch10 → Cut-Extrude1 (cut, through all)
    with BuildSketch(Plane(origin=(0, 0, -20), x_dir=(-1, 0, 0), z_dir=(0, 0, -1))):
        with Locations((0, 450.09)):
            Circle(SKETCH10_R)
    extrude(amount=-CUT_EXTRUDE1_DEPTH, mode=Mode.SUBTRACT)

    # Fillet1
    fillet1_edges = [part.edges().sort_by_distance(p)[0] for p in [
        (-20, 20, 70),
    ]]
    fillet(fillet1_edges, radius=FILLET1_R)

    # Fillet2
    fillet2_edges = [part.edges().sort_by_distance(p)[0] for p in [
        (-20, 20, -70),
    ]]
    fillet(fillet2_edges, radius=FILLET2_R)

    # Sketch11 → Extrude9 (add)
    with BuildSketch(Plane.XZ.offset(-40)):
        with Locations((-10, 0)):
            Rectangle(SKETCH11_W, SKETCH11_H)
    extrude(amount=EXTRUDE9_DEPTH)

    # Fillet3
    fillet3_edges = [part.edges().sort_by_distance(p)[0] for p in [
        (5, 20, -70),
        (5, 20, 70),
    ]]
    fillet(fillet3_edges, radius=FILLET3_R)

    # Fillet4
    fillet4_edges = [part.edges().sort_by_distance(p)[0] for p in [
        (0, 430.09, -15),
        (0, 430.09, 15),
    ]]
    fillet(fillet4_edges, radius=FILLET4_R)


solid = part.part
